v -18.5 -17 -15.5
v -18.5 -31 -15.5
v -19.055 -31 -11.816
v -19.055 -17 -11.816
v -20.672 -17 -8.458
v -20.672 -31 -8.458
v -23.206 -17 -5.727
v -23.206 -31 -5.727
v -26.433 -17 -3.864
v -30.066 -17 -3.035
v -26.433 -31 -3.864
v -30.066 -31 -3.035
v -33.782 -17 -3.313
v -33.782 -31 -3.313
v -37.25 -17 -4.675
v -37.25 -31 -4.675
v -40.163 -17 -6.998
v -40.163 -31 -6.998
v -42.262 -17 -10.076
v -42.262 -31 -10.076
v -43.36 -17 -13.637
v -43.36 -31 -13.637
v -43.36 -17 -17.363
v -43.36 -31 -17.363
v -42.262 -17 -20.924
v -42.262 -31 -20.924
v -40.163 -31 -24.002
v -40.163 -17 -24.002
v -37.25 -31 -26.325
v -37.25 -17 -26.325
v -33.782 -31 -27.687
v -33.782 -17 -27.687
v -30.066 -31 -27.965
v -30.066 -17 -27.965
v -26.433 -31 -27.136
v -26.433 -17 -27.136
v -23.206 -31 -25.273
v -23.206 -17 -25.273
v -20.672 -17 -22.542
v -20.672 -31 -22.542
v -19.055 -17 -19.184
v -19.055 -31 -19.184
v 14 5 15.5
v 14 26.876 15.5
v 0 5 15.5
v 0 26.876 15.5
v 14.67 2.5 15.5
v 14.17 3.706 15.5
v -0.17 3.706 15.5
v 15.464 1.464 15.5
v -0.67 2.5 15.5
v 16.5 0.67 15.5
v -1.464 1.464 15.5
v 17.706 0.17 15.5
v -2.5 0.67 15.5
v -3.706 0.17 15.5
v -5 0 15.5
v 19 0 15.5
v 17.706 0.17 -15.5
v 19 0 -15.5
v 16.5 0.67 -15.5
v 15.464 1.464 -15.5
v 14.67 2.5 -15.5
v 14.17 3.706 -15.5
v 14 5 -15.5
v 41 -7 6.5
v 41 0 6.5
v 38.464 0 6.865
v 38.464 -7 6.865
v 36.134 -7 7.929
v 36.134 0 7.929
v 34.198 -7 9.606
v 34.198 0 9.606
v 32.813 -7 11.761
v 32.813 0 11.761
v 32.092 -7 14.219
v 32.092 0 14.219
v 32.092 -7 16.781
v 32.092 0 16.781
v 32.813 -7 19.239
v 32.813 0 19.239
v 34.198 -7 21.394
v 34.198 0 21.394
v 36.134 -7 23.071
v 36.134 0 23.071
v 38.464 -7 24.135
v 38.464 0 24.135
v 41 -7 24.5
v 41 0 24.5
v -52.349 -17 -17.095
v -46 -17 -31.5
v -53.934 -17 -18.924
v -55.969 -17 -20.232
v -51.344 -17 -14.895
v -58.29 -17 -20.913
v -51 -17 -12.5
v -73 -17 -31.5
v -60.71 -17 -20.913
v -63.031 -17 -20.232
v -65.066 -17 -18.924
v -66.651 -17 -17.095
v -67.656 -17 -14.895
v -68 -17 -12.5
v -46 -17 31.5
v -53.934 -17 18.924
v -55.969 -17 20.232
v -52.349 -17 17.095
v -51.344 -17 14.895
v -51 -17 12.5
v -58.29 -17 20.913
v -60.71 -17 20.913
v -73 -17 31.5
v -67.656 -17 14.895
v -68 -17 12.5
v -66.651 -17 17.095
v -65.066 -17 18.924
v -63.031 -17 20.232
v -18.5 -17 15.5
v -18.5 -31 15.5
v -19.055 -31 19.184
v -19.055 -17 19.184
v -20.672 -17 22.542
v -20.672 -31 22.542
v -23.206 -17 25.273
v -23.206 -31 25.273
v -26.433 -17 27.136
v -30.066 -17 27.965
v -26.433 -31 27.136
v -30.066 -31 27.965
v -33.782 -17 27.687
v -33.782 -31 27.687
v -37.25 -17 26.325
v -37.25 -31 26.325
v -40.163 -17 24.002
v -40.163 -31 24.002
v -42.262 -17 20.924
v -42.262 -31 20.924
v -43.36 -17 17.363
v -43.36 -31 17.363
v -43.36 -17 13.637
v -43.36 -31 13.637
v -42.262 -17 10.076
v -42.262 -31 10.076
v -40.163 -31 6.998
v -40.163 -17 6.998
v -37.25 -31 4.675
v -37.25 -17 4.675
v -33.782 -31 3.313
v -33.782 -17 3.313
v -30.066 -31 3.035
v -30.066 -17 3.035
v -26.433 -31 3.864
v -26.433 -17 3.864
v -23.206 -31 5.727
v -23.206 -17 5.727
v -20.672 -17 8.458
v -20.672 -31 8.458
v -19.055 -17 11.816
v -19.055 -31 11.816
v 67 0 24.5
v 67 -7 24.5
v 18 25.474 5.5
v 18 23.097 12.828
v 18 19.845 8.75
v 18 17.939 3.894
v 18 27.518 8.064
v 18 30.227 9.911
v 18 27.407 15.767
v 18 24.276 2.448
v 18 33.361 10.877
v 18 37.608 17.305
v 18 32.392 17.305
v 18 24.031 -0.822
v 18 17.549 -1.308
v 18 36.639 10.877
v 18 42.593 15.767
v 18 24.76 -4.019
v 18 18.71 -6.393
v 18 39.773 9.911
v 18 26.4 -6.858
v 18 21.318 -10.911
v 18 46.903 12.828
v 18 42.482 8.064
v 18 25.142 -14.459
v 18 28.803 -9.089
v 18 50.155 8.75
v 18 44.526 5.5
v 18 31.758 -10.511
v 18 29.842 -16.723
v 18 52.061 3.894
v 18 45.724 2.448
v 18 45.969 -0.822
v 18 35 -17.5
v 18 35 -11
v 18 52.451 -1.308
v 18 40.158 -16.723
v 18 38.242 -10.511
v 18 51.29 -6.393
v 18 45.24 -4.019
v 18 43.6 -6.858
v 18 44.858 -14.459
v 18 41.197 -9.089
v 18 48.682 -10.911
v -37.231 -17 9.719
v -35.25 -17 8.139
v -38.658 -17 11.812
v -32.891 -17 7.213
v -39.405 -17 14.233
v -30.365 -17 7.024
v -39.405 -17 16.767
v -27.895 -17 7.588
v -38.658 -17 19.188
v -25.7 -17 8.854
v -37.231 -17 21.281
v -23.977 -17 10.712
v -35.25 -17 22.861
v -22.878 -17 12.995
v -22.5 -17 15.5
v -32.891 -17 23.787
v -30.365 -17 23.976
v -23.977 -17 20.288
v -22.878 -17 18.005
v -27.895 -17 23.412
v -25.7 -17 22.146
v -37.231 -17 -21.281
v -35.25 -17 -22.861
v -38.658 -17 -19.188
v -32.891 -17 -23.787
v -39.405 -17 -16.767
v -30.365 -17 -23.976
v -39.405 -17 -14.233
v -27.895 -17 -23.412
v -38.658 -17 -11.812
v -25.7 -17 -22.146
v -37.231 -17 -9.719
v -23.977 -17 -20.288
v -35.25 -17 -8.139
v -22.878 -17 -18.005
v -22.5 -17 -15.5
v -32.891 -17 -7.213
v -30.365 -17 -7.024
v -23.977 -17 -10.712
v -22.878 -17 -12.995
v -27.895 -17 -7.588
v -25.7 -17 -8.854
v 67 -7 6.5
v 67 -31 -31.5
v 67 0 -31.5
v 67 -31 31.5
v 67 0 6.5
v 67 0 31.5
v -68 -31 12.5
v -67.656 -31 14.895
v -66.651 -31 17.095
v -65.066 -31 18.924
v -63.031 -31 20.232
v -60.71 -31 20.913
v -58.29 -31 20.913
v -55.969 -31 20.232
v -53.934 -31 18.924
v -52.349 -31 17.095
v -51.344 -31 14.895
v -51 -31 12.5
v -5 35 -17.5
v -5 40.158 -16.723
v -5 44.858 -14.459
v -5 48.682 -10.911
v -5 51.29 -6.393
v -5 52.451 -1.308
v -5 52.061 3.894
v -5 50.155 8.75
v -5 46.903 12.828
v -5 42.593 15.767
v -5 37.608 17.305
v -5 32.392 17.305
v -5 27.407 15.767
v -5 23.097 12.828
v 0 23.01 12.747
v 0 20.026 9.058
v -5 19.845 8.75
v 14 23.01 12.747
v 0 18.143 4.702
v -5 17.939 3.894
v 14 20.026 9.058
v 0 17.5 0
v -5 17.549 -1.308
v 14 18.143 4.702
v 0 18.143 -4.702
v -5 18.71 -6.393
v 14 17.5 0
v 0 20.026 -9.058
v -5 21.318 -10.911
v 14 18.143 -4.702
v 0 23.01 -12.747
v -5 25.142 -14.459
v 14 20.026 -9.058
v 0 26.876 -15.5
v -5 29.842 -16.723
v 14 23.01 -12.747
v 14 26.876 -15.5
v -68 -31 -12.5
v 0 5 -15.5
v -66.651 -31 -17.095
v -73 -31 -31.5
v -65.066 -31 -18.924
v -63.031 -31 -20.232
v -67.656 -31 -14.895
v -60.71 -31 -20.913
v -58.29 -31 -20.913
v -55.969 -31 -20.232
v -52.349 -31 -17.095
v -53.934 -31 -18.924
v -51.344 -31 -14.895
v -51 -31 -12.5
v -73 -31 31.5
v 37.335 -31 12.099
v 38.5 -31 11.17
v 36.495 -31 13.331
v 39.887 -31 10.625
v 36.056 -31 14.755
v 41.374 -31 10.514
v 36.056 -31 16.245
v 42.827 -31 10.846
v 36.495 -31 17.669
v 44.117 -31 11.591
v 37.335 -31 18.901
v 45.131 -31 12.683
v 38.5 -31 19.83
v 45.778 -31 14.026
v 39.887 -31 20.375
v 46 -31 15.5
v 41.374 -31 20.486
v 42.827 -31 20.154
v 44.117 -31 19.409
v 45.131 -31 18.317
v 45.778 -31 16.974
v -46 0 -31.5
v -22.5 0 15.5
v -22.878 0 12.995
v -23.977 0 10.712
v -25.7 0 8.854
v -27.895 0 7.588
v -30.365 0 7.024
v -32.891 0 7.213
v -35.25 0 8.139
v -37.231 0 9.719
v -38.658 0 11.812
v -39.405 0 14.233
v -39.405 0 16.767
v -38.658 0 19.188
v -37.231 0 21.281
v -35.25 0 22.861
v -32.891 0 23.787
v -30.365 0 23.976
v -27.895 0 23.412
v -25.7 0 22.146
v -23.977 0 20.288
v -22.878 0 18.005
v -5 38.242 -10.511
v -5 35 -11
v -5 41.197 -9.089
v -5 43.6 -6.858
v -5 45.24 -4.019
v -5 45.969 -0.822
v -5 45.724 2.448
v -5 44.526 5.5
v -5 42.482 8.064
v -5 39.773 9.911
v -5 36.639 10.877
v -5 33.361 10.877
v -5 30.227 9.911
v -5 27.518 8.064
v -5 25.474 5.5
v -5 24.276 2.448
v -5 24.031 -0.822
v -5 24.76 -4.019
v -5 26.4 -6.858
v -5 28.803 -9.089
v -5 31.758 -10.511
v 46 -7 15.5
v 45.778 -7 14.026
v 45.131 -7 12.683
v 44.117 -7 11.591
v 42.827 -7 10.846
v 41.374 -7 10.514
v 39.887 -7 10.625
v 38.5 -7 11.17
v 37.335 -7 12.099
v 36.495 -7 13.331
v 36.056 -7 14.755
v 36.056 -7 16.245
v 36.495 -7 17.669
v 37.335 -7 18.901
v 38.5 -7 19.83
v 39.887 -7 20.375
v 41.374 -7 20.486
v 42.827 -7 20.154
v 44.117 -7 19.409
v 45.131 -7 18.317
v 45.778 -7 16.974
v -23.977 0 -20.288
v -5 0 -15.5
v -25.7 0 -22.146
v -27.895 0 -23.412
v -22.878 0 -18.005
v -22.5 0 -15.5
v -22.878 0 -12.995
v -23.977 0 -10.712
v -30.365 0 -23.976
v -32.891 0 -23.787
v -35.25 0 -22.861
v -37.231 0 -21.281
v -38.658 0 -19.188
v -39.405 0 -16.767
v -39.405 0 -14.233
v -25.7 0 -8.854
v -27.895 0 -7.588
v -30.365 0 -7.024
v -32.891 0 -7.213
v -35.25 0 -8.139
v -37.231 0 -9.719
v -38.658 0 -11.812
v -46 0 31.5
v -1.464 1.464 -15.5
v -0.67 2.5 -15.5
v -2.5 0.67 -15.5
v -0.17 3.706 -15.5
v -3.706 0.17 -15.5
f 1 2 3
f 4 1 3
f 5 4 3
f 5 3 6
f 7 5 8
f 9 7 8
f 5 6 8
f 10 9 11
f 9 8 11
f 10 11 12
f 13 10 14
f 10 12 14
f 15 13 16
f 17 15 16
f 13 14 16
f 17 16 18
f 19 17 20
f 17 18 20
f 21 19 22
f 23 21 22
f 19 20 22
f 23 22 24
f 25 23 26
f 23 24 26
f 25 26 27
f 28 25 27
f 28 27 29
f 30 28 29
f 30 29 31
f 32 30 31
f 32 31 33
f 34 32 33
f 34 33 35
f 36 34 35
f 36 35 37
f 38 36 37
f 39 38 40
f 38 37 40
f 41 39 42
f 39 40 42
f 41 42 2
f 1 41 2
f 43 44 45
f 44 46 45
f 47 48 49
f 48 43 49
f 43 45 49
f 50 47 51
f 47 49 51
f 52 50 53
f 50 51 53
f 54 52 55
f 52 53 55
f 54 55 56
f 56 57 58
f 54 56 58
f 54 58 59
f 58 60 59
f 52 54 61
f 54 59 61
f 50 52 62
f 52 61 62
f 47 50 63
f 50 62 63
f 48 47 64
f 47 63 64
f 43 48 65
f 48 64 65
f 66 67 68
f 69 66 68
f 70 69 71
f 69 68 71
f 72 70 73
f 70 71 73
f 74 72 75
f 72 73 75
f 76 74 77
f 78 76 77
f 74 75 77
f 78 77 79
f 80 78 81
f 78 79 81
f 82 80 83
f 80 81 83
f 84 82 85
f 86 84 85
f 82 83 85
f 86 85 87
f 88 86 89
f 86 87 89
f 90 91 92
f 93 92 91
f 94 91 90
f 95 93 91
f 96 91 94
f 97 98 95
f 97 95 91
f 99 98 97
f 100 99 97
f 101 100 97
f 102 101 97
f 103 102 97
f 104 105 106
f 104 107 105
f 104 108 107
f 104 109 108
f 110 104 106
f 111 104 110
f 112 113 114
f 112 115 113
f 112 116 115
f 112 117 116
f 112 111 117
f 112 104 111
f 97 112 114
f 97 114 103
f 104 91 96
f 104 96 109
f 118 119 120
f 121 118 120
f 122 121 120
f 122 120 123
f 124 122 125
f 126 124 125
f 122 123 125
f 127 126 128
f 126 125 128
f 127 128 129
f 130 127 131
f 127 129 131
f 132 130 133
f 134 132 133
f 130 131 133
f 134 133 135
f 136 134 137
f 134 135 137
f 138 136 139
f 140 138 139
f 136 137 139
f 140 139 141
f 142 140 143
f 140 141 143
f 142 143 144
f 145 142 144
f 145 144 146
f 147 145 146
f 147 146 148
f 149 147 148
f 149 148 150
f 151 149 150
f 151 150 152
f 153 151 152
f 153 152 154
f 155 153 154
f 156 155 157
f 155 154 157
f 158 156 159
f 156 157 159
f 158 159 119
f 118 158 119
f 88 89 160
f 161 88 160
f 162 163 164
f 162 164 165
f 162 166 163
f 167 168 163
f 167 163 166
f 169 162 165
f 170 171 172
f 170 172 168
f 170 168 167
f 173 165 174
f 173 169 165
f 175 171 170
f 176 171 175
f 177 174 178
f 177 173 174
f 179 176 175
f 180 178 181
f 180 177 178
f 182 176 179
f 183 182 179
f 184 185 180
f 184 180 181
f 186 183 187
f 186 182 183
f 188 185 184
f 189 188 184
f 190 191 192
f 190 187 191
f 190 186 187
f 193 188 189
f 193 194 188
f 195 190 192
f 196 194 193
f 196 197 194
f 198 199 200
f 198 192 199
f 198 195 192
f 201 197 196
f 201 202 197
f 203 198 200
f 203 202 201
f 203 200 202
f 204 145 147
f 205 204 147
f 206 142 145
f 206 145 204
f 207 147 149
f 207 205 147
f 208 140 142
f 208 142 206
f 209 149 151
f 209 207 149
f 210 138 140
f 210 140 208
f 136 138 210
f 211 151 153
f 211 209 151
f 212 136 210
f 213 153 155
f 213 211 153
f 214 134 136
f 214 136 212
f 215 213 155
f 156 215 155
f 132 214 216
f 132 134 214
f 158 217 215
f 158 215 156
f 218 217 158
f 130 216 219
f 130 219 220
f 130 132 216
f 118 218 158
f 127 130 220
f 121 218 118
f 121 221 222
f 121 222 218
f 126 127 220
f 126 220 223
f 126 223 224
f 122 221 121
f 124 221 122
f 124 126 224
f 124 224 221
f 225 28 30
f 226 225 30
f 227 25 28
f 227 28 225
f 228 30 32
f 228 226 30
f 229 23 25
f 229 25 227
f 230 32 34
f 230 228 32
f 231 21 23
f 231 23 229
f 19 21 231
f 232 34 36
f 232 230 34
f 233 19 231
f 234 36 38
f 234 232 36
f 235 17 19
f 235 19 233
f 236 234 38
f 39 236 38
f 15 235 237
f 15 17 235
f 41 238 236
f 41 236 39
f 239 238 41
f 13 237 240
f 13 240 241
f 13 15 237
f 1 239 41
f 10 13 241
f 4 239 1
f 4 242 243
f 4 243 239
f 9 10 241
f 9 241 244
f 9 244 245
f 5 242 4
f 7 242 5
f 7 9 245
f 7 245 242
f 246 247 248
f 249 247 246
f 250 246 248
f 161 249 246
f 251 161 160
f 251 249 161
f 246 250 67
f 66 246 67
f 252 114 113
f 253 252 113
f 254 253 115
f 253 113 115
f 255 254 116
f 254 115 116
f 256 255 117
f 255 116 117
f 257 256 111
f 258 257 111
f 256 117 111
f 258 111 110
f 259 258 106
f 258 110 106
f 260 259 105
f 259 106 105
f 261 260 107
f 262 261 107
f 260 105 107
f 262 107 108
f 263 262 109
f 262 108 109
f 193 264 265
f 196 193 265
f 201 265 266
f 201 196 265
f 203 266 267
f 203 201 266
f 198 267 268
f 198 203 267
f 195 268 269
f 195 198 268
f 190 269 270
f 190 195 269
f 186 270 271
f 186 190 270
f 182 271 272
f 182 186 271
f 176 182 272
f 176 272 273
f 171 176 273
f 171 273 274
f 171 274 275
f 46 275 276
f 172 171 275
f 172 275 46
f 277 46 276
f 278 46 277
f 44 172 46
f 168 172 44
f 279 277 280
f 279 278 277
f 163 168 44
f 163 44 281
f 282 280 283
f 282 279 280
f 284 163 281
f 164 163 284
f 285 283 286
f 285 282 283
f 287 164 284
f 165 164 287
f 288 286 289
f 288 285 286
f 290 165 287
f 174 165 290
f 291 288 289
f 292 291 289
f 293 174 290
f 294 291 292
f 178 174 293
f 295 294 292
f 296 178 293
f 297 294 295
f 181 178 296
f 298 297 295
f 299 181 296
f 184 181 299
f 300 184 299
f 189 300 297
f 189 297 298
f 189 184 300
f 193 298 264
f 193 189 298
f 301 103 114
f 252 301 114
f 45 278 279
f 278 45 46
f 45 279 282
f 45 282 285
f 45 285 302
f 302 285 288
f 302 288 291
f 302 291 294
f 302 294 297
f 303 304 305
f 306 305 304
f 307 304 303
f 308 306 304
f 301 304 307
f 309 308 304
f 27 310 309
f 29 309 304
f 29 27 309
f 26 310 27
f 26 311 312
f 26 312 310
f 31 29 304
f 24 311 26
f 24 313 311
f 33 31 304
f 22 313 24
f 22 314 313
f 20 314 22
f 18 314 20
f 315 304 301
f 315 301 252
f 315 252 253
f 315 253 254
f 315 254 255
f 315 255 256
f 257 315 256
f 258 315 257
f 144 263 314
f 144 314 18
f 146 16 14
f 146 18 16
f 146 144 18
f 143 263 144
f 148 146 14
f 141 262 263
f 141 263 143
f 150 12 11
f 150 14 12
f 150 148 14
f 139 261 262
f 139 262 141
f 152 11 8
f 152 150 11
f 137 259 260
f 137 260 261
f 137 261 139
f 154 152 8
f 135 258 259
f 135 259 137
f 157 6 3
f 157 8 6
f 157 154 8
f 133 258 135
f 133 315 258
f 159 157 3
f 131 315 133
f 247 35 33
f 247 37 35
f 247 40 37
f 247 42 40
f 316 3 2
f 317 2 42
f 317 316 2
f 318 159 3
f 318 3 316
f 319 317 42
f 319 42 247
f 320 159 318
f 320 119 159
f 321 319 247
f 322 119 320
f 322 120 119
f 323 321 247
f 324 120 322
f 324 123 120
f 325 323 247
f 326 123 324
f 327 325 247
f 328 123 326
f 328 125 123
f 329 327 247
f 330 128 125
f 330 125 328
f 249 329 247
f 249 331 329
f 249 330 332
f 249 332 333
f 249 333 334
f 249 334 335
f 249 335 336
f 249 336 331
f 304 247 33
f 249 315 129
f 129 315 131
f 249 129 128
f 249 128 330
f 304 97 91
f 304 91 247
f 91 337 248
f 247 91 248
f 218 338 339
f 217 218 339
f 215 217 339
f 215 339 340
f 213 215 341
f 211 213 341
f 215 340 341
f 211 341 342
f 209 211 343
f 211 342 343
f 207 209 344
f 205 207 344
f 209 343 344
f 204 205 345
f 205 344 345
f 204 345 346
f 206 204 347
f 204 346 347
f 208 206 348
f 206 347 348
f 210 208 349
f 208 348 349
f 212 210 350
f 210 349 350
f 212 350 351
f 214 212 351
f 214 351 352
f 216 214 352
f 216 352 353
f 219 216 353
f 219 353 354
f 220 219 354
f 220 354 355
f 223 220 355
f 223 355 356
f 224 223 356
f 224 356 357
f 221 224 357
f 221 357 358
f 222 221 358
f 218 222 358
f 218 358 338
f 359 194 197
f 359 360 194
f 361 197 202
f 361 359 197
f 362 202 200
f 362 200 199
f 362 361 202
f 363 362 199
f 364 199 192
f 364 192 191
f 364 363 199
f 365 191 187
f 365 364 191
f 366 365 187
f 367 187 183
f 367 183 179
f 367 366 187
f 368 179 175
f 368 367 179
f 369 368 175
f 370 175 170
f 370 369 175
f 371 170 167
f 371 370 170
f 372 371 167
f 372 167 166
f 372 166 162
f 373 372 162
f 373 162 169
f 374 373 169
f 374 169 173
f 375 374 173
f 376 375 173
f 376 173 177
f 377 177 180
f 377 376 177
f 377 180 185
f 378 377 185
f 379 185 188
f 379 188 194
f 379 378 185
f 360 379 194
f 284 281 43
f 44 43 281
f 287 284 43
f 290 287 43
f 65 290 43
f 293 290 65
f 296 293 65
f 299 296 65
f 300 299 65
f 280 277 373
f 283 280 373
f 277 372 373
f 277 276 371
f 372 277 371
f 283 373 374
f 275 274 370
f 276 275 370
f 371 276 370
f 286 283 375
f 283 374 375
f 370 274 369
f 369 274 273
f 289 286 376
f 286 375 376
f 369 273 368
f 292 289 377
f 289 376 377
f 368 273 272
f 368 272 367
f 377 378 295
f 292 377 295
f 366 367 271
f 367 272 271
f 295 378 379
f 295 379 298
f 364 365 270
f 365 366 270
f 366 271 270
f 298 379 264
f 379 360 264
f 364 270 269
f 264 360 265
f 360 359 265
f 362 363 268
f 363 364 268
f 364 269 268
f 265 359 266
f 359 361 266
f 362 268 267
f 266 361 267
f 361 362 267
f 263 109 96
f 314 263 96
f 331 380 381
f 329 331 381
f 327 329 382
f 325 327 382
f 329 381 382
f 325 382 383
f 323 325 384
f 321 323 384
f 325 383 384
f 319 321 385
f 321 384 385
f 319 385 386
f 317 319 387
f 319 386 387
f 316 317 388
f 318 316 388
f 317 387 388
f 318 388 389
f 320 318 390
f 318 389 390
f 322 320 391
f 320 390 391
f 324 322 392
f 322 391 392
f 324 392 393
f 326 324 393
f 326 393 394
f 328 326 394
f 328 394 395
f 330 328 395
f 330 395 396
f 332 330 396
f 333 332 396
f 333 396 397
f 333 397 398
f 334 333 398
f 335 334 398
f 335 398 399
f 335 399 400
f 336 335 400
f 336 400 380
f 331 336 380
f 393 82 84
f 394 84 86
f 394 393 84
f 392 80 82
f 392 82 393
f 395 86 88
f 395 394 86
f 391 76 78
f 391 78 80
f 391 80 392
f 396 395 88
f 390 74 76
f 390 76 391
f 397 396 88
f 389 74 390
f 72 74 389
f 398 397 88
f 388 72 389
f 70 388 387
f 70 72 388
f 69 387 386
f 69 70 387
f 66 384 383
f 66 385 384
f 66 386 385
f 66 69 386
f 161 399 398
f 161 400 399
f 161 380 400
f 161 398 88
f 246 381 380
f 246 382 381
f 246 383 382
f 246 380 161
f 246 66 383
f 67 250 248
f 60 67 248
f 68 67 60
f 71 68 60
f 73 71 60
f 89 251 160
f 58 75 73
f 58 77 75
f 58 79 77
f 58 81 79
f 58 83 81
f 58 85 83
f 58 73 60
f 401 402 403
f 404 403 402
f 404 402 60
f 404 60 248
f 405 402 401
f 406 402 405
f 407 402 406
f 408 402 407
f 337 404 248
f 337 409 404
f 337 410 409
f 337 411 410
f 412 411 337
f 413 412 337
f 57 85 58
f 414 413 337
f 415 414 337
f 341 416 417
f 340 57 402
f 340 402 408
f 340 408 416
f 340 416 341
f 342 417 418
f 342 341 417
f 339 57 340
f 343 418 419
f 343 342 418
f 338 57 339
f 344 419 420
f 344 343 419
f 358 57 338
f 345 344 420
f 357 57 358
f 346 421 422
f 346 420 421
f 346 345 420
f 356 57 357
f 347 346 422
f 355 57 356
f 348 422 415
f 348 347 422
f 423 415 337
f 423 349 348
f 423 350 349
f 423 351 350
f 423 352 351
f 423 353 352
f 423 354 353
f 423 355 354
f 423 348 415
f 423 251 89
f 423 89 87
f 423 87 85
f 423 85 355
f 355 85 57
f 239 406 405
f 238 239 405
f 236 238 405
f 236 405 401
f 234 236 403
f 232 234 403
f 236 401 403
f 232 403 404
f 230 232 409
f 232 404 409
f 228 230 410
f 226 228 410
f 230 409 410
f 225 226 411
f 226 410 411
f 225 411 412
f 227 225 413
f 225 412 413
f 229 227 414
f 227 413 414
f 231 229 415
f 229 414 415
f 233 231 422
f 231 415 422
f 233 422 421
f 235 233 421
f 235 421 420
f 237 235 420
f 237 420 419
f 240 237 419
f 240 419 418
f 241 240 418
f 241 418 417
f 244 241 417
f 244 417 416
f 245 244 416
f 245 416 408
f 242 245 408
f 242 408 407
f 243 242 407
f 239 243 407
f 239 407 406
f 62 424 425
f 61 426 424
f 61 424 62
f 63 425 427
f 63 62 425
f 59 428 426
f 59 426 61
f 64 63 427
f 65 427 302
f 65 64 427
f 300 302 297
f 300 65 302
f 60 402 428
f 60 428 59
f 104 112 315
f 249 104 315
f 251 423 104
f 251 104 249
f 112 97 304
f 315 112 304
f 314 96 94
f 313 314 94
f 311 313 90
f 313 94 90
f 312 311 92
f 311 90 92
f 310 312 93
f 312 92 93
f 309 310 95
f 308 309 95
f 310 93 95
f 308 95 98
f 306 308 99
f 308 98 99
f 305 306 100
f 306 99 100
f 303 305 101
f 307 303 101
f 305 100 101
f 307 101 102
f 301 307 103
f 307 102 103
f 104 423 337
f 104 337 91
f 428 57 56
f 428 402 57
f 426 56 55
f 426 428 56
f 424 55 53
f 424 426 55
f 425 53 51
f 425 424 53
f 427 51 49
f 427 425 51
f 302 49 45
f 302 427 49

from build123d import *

# Parameters (mm, degrees)
BOSS_EXTRUDE1_DEPTH      = 31.5
SKETCH3_R                = 5
CUT_EXTRUDE1_DEPTH       = 86.336100216
SKETCH3_3_R              = 5
CUT_EXTRUDE2_DEPTH       = 7
SKETCH3_5_R              = 8.5
CUT_EXTRUDE3_DEPTH       = 86.336100216
CUT_EXTRUDE4_DEPTH       = 86.336100216
SKETCH4_R                = 12.5
CUT_EXTRUDE5_DEPTH       = 14
BOSS_EXTRUDE2_DEPTH      = 14
BOSS_EXTRUDE2_DEPTH_BACK = 9
SKETCH5_R                = 11
BOSS_EXTRUDE4_DEPTH      = 10
BOSS_EXTRUDE4_DEPTH_BACK = 4
FILLET1_R                = 5


with BuildPart() as part:
    # Sketch1 → Boss-Extrude1 (new, symmetric)
    with BuildSketch(Plane.XY):
        Polygon((-73, -31), (67, -31), (67, 0), (-46, 0), (-46, -17), (-73, -17), align=None)
    extrude(amount=BOSS_EXTRUDE1_DEPTH, both=True)

    # Sketch3 → Cut-Extrude1 (cut, through all)
    with BuildSketch(Plane(origin=(0, 0, 0), x_dir=(1, 0, 0), z_dir=(0, 1, 0))):
        with Locations((41, -15.5)):
            Circle(SKETCH3_R)
    extrude(amount=-CUT_EXTRUDE1_DEPTH, mode=Mode.SUBTRACT)

    # Sketch3<3> → Cut-Extrude2 (cut)
    with BuildSketch(Plane(origin=(0, 0, 0), x_dir=(1, 0, 0), z_dir=(0, 1, 0))):
        with BuildLine():
            Line((41, -24.5), (67, -24.5))
            Line((67, -24.5), (67, -6.5))
            Line((67, -6.5), (41, -6.5))
            ThreePointArc((41, -6.5), (32, -15.5), (41, -24.5))
        make_face()
        with Locations((41, -15.5)):
            Circle(SKETCH3_3_R, mode=Mode.SUBTRACT)
    extrude(amount=-CUT_EXTRUDE2_DEPTH, mode=Mode.SUBTRACT)

    # Sketch3<5> → Cut-Extrude3 (cut, through all)
    with BuildSketch(Plane(origin=(0, 0, 0), x_dir=(1, 0, 0), z_dir=(0, 1, 0))):
        with Locations((-31, 15.5)):
            Circle(SKETCH3_5_R)
        with Locations((-31, -15.5)):
            Circle(SKETCH3_5_R)
    extrude(amount=-CUT_EXTRUDE3_DEPTH, mode=Mode.SUBTRACT)

    # Sketch3<6> → Cut-Extrude4 (cut, through all)
    with BuildSketch(Plane(origin=(0, 0, 0), x_dir=(1, 0, 0), z_dir=(0, 1, 0))):
        with BuildLine():
            Line((-51, -12.5), (-51, 12.5))
            ThreePointArc((-51, 12.5), (-59.5, 21), (-68, 12.5))
            Line((-68, 12.5), (-68, -12.5))
            ThreePointArc((-68, -12.5), (-59.5, -21), (-51, -12.5))
        make_face()
    extrude(amount=-CUT_EXTRUDE4_DEPTH, mode=Mode.SUBTRACT)

    # Sketch4 → Cut-Extrude5 (cut)
    with BuildSketch(Plane.XZ.offset(31)):
        with Locations((-31, 15.5)):
            Circle(SKETCH4_R)
        with Locations((-31, -15.5)):
            Circle(SKETCH4_R)
    extrude(amount=-CUT_EXTRUDE5_DEPTH, mode=Mode.SUBTRACT)



with BuildPart() as body_2:
    # Sketch5 → Boss-Extrude2 (new, two sides: drawn at the far end of the back side and taken through both)
    with BuildSketch(Plane(origin=(4, 0, 0), x_dir=(0, 0, -1), z_dir=(1, 0, 0)).offset(-BOSS_EXTRUDE2_DEPTH_BACK)):
        with BuildLine():
            ThreePointArc((-15.5, 26.875961595), (0, 17.5), (15.5, 26.875961595))
            ThreePointArc((15.5, 26.875961595), (16.992645468, 30.816699867), (17.5, 35))
            ThreePointArc((17.5, 35), (-4.183300133, 51.992645468), (-15.5, 26.875961595))
        make_face()
        with Locations((0, 35)):
            Circle(SKETCH5_R, mode=Mode.SUBTRACT)
    extrude(amount=BOSS_EXTRUDE2_DEPTH + BOSS_EXTRUDE2_DEPTH_BACK)


with BuildPart() as part_1:
    add(part.part)

    add(body_2.part)  # Boss-Extrude4 merges body 2
    # Sketch5<6> → Boss-Extrude4 (add, two sides: drawn at the far end of the back side and taken through both)
    with BuildSketch(Plane(origin=(4, 0, 0), x_dir=(0, 0, -1), z_dir=(1, 0, 0)).offset(-BOSS_EXTRUDE4_DEPTH_BACK)):
        with BuildLine():
            Line((-15.5, 0), (15.5, 0))
            Line((15.5, 0), (15.5, 26.875961595))
            ThreePointArc((15.5, 26.875961595), (0, 17.5), (-15.5, 26.875961595))
            Line((-15.5, 26.875961595), (-15.5, 0))
        make_face()
    extrude(amount=BOSS_EXTRUDE4_DEPTH + BOSS_EXTRUDE4_DEPTH_BACK)

    # Fillet1
    fillet1_edges = [part_1.edges().sort_by_distance(p)[0] for p in [
        (14, 0, 0),
        (0, 0, 0),
    ]]
    fillet(fillet1_edges, radius=FILLET1_R)


solid = part_1.part
